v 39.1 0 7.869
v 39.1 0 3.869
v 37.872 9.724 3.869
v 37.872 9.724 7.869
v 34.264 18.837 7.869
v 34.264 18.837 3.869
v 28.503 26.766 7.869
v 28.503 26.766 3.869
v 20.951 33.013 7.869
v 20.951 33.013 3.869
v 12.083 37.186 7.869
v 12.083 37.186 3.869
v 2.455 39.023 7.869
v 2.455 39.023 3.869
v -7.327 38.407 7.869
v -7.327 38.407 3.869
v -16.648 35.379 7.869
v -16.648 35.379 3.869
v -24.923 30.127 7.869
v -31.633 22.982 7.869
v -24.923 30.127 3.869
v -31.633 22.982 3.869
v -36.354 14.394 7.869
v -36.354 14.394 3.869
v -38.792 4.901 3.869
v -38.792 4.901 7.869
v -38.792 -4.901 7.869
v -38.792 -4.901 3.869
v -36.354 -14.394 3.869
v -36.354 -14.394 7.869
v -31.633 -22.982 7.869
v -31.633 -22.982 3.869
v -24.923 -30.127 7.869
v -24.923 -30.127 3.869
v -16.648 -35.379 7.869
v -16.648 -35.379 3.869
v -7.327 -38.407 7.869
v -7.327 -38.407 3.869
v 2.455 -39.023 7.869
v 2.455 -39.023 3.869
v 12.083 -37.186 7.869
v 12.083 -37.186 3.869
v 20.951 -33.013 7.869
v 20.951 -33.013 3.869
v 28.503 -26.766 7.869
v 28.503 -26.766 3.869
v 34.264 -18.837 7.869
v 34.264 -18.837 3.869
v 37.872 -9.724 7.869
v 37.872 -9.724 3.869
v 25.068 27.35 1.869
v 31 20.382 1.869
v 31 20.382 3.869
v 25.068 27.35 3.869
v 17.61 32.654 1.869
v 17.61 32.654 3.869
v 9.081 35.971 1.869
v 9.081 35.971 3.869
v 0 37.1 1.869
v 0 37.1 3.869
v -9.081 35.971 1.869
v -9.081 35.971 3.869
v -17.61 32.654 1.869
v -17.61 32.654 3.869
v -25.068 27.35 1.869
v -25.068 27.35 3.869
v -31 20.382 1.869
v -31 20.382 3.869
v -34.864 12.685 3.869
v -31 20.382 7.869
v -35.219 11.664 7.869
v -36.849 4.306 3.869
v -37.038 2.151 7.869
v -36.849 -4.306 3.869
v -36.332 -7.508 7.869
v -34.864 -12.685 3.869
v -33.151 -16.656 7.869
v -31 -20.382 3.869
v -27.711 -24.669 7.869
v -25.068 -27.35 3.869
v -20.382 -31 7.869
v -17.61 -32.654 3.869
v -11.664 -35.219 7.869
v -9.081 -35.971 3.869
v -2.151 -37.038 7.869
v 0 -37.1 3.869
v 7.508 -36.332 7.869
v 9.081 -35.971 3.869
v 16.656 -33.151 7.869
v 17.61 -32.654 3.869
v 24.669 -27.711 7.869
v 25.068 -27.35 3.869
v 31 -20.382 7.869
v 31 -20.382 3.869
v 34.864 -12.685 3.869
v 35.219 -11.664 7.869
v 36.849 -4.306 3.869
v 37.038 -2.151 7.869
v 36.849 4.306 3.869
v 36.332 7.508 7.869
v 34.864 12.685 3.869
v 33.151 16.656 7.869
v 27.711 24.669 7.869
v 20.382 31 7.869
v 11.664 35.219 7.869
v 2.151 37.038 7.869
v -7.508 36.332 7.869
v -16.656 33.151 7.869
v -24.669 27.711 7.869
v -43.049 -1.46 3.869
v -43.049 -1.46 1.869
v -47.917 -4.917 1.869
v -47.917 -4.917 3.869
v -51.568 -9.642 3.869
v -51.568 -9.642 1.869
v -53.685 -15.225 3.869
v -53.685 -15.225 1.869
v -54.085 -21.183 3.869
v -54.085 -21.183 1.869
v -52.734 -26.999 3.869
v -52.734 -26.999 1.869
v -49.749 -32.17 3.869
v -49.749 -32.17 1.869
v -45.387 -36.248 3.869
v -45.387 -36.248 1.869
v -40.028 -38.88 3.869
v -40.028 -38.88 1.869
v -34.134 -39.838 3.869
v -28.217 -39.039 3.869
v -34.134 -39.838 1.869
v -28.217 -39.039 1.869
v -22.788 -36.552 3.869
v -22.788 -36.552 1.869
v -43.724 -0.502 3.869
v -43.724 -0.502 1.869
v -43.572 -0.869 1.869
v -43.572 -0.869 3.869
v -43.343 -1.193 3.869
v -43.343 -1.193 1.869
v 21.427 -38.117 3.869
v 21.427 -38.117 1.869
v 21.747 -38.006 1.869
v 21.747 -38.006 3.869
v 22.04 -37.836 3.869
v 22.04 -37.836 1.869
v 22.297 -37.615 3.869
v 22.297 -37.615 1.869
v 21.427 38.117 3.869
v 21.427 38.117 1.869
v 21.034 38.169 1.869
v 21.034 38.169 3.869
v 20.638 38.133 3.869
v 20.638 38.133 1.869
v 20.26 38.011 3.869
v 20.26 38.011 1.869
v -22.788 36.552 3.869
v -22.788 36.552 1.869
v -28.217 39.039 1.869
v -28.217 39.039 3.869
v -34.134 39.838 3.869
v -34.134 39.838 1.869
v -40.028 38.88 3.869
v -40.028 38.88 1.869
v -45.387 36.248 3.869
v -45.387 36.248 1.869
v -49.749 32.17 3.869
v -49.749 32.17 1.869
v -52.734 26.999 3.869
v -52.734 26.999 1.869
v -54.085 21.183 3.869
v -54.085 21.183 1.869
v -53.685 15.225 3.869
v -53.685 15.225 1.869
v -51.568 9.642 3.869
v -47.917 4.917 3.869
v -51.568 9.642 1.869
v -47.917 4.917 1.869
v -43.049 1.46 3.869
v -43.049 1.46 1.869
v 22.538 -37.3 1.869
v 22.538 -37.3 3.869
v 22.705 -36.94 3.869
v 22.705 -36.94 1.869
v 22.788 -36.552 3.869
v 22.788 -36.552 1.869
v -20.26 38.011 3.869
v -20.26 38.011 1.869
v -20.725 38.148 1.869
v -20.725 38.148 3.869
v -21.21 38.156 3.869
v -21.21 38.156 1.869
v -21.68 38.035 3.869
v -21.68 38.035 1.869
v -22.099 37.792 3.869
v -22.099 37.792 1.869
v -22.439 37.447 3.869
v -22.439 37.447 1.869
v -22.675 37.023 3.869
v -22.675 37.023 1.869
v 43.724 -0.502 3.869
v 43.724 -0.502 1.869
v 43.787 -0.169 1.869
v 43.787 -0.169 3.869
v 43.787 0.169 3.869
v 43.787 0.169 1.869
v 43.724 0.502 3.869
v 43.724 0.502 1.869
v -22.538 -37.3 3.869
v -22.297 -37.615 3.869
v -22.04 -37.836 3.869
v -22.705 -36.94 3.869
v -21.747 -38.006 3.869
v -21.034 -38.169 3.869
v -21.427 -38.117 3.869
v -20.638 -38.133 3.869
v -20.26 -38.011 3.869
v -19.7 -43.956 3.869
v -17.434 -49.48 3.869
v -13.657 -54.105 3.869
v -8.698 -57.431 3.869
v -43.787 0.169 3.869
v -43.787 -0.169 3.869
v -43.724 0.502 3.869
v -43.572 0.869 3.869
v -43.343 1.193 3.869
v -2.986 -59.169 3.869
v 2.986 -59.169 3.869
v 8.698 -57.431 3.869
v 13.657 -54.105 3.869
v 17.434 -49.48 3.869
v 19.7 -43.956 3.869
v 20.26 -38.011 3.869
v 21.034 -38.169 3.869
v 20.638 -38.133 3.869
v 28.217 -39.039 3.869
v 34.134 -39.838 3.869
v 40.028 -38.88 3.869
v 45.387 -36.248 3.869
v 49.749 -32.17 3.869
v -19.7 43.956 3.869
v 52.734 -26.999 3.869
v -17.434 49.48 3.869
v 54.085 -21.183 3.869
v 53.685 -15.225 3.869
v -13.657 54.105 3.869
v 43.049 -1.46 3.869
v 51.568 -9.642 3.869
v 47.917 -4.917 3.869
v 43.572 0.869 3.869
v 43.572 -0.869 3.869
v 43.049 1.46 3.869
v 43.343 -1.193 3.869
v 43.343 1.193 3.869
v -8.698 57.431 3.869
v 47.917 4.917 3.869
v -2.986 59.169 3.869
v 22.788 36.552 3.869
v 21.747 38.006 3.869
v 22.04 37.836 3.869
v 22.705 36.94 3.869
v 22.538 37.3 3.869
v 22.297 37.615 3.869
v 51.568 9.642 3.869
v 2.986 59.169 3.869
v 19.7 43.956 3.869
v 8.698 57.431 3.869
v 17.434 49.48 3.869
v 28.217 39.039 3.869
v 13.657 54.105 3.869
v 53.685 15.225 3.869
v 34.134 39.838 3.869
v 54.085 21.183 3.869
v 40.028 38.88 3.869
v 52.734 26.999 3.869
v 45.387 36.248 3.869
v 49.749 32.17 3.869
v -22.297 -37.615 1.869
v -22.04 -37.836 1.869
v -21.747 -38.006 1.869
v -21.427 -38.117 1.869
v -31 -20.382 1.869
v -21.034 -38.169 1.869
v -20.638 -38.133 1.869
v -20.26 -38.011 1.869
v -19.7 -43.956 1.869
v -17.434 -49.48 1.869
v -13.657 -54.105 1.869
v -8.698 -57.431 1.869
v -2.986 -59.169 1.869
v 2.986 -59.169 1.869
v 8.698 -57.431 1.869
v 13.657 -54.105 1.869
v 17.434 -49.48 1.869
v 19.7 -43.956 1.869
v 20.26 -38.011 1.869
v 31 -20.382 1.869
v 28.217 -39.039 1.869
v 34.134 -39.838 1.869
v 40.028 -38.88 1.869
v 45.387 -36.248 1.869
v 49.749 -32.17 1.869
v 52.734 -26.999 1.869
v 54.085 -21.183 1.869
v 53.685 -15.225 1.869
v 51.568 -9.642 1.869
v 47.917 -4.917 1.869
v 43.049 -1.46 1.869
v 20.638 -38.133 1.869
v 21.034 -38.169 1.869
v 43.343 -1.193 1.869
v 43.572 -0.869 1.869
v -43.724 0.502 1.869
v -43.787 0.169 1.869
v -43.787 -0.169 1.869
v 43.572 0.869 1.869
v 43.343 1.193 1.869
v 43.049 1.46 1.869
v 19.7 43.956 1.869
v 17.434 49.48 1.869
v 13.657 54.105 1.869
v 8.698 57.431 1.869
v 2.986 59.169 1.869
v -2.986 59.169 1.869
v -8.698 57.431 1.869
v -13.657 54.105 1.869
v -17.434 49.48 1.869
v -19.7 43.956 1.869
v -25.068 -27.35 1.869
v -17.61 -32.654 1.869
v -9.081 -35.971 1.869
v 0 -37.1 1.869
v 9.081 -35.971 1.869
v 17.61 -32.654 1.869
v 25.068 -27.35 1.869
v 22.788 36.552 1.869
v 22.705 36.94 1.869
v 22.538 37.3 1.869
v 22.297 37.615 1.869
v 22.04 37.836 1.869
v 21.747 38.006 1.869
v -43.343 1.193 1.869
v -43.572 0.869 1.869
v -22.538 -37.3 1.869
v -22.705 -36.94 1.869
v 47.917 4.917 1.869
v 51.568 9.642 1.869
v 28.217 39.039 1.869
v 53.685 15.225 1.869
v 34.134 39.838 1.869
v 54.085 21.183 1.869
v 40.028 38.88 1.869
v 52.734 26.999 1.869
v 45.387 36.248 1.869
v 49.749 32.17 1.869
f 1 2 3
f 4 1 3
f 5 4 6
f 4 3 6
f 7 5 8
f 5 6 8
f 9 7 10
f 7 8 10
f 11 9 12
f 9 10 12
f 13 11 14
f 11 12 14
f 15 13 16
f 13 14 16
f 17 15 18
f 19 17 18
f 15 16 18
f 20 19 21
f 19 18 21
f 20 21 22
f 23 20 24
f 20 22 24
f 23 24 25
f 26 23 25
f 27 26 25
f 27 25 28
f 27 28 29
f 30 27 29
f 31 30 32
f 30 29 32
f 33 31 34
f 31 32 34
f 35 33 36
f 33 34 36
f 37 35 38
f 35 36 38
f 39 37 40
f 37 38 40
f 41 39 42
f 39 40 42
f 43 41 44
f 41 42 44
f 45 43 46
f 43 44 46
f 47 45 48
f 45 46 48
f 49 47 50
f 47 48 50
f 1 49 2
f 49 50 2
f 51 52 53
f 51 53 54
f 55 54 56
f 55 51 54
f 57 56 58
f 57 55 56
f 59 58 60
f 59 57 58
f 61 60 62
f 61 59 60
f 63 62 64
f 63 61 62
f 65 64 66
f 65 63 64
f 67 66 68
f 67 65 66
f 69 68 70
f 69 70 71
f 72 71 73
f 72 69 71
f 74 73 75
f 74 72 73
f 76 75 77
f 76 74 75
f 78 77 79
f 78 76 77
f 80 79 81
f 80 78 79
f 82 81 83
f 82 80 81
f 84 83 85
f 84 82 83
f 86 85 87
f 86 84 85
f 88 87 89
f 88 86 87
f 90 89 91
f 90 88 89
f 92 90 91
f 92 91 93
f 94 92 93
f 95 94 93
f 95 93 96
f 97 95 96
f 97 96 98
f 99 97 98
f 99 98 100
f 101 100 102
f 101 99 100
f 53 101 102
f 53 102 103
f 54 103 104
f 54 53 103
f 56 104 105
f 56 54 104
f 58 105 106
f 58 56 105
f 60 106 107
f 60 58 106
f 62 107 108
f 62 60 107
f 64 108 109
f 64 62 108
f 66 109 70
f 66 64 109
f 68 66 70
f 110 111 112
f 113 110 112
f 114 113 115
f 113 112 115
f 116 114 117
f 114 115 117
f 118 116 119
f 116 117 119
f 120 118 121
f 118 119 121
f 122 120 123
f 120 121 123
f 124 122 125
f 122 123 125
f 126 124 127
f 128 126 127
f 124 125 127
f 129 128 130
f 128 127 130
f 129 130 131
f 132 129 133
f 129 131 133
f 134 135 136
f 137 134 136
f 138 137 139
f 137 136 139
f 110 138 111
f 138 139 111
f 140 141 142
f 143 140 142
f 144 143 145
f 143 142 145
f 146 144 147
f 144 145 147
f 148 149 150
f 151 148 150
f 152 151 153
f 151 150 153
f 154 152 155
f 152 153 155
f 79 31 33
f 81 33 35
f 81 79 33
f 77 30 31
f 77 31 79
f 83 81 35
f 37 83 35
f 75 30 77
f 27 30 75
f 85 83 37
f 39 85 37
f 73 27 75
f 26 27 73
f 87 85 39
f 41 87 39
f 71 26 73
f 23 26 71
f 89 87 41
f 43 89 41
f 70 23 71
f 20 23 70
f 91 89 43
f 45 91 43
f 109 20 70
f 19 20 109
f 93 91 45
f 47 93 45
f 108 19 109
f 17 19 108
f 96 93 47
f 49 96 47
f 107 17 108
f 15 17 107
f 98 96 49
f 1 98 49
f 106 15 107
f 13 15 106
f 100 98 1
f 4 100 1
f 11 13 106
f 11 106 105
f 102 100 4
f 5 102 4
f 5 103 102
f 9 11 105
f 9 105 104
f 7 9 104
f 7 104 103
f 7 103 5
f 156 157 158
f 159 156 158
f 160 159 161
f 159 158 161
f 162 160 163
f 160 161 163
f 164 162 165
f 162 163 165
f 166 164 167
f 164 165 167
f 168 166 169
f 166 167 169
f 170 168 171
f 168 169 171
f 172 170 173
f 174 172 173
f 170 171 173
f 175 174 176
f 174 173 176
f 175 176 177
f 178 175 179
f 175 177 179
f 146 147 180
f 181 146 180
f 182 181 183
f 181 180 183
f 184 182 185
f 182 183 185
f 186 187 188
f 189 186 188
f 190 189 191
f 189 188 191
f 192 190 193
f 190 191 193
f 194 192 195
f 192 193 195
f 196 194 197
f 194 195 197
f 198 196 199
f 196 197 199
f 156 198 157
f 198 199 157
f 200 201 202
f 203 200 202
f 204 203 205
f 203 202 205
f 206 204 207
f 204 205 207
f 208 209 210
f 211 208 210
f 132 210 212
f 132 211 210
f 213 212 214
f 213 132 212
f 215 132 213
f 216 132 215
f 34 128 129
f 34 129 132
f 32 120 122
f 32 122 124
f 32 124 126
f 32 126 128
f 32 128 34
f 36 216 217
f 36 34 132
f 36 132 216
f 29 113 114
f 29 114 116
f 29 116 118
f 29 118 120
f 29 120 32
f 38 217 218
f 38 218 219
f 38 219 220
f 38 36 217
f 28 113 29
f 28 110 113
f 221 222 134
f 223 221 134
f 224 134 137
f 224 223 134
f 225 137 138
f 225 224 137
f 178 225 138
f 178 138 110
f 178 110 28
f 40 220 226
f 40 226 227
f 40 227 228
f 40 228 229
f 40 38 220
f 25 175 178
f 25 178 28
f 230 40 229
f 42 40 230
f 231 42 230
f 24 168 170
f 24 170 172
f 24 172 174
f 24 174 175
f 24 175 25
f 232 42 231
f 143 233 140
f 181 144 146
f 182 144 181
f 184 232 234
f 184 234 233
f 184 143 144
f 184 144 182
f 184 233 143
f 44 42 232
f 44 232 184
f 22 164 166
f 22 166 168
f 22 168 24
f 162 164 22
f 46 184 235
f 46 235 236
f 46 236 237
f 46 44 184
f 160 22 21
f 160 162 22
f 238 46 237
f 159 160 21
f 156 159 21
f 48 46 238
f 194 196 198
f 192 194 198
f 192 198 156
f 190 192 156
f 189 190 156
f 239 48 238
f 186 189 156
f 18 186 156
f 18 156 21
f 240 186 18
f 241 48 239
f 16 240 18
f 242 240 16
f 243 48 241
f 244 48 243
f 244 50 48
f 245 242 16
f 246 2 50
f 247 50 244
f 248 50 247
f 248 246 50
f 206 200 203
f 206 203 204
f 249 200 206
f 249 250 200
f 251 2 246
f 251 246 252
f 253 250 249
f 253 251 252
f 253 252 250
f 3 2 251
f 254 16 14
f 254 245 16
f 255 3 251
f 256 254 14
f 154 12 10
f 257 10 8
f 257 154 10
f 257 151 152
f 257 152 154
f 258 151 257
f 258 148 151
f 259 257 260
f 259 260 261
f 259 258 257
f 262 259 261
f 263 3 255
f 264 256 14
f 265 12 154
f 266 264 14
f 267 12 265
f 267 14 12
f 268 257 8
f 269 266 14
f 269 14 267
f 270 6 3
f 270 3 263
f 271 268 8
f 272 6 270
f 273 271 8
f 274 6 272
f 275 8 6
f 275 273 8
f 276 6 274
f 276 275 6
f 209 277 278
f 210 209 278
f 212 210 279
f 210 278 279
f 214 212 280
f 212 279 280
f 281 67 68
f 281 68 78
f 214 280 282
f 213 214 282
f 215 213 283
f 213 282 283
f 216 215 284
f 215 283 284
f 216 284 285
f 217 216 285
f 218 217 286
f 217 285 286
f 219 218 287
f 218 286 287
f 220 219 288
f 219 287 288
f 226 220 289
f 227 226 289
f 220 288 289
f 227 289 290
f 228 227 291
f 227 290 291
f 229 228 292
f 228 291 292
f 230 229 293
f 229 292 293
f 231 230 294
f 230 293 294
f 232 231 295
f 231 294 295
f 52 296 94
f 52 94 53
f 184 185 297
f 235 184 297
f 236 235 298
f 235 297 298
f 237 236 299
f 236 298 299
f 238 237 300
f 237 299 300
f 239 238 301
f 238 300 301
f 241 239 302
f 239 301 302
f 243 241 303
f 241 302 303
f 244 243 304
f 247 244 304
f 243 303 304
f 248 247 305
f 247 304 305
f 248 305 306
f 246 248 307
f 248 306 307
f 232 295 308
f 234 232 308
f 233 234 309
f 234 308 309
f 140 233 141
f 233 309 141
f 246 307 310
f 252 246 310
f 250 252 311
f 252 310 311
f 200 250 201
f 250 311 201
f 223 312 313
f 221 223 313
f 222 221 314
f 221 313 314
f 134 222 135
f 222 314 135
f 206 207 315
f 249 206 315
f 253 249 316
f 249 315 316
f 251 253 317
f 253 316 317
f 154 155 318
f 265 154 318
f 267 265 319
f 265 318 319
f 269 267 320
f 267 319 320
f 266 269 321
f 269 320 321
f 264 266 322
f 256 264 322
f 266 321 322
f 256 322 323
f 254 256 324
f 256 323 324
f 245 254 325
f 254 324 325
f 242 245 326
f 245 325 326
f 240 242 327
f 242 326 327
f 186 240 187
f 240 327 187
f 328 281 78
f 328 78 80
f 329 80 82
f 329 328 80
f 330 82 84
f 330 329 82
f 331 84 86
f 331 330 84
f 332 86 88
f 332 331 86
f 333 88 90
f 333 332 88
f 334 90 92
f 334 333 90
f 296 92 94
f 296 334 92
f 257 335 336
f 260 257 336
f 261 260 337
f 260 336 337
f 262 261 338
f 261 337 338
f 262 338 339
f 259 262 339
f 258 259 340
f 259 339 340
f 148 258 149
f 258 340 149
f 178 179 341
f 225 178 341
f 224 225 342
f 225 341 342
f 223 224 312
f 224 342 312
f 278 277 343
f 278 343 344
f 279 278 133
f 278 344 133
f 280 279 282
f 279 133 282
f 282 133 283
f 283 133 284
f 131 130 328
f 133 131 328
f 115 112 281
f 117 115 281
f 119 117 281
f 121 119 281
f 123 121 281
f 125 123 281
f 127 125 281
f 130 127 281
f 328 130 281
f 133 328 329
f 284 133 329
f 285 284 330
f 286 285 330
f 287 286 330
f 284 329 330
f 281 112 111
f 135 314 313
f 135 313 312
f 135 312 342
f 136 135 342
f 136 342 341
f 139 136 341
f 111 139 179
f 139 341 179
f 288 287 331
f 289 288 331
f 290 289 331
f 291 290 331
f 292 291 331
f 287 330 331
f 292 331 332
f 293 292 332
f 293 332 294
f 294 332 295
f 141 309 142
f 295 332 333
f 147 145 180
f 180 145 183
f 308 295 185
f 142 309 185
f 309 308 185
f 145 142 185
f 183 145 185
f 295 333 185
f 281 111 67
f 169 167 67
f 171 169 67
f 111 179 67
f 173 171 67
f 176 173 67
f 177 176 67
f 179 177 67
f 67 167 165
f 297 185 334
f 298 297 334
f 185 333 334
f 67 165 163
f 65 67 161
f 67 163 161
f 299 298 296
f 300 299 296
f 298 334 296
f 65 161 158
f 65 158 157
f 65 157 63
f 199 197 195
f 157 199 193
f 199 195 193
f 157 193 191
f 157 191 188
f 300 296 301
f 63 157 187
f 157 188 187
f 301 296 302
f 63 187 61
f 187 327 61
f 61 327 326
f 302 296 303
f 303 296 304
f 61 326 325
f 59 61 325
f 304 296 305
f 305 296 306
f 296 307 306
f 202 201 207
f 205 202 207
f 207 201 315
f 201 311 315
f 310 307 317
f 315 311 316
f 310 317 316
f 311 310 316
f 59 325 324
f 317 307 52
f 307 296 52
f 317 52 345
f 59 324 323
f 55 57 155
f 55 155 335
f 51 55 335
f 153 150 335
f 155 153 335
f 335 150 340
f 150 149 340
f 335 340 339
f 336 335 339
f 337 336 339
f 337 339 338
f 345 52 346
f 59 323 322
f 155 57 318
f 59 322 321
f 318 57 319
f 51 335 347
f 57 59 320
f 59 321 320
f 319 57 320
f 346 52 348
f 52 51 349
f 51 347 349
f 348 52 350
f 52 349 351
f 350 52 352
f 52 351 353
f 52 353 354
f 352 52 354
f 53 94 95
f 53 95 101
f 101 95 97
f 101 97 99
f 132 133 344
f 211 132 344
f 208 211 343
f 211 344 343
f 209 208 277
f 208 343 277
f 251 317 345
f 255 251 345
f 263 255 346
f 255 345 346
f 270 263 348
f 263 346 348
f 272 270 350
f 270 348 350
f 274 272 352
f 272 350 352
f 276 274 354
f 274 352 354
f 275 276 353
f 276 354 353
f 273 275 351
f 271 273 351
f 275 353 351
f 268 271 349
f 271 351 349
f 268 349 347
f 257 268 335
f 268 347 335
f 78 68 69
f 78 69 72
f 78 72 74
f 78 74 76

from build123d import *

# Parameters (mm, degrees)
BACK_PLATE_DEPTH    = 2
SKETCH3_R           = 39.1
SKETCH3_R_2         = 37.1
BOSS_EXTRUDE2_DEPTH = 4


with BuildPart() as part:
    # Sketch2 → Back Plate (new body)
    with BuildSketch(Plane.XY.offset(1.869079413)):
        with BuildLine():
            ThreePointArc((-22.788405672, 36.551599508), (-51.432945039, 29.694824664), (-43.048816559, 1.45953847))
            ThreePointArc((-43.048816559, 1.45953847), (-43.466528344, 1.037157748), (-43.724007211, 0.501813707))
            ThreePointArc((-43.724007211, 0.501813707), (-43.795371043, 0), (-43.724007211, -0.501813707))
            ThreePointArc((-43.724007211, -0.501813707), (-43.466528344, -1.037157748), (-43.048816559, -1.45953847))
            ThreePointArc((-43.048816559, -1.45953847), (-51.432945039, -29.694824664), (-22.788405672, -36.551599508))
            ThreePointArc((-22.788405672, -36.551599508), (-22.63146913, -37.124538886), (-22.296587024, -37.615194147))
            ThreePointArc((-22.296587024, -37.615194147), (-21.897685521, -37.927903891), (-21.427420187, -38.117007854))
            ThreePointArc((-21.427420187, -38.117007854), (-20.835059214, -38.161696634), (-20.260410887, -38.011137978))
            ThreePointArc((-20.260410887, -38.011137978), (0, -59.389649327), (20.260410887, -38.011137978))
            ThreePointArc((20.260410887, -38.011137978), (20.835059214, -38.161696634), (21.427420187, -38.117007854))
            ThreePointArc((21.427420187, -38.117007854), (21.897685521, -37.927903891), (22.296587024, -37.615194147))
            ThreePointArc((22.296587024, -37.615194147), (22.63146913, -37.124538886), (22.788405672, -36.551599508))
            ThreePointArc((22.788405672, -36.551599508), (51.432945039, -29.694824664), (43.048816559, -1.45953847))
            ThreePointArc((43.048816559, -1.45953847), (43.466528344, -1.037157748), (43.724007211, -0.501813707))
            ThreePointArc((43.724007211, -0.501813707), (43.795371043, 0), (43.724007211, 0.501813707))
            ThreePointArc((43.724007211, 0.501813707), (43.466528344, 1.037157748), (43.048816559, 1.45953847))
            ThreePointArc((43.048816559, 1.45953847), (51.432945039, 29.694824664), (22.788405672, 36.551599508))
            ThreePointArc((22.788405672, 36.551599508), (22.63146913, 37.124538886), (22.296587024, 37.615194147))
            ThreePointArc((22.296587024, 37.615194147), (21.897685521, 37.927903891), (21.427420187, 38.117007854))
            ThreePointArc((21.427420187, 38.117007854), (20.835059214, 38.161696634), (20.260410887, 38.011137978))
            ThreePointArc((20.260410887, 38.011137978), (0, 59.389649327), (-20.260410887, 38.011137978))
            ThreePointArc((-20.260410887, 38.011137978), (-21.897685521, 37.927903891), (-22.788405672, 36.551599508))
        make_face()
        with BuildLine():
            Line((-31, 20.381609357), (-31, -20.381609357))
            ThreePointArc((-31, -20.381609357), (0, -37.1), (31, -20.381609357))
            Line((31, -20.381609357), (31, 20.381609357))
            ThreePointArc((31, 20.381609357), (0, 37.1), (-31, 20.381609357))
        make_face(mode=Mode.SUBTRACT)
    extrude(amount=BACK_PLATE_DEPTH)

    # Sketch3 → Boss-Extrude2 (add)
    with BuildSketch(Plane.XY.offset(3.869079413)):
        Circle(SKETCH3_R)
        with Locations(Location((0, 0, 0), (0, 0, 146.676229541))):
            Circle(SKETCH3_R_2, mode=Mode.SUBTRACT)
    extrude(amount=BOSS_EXTRUDE2_DEPTH)


solid = part.part
